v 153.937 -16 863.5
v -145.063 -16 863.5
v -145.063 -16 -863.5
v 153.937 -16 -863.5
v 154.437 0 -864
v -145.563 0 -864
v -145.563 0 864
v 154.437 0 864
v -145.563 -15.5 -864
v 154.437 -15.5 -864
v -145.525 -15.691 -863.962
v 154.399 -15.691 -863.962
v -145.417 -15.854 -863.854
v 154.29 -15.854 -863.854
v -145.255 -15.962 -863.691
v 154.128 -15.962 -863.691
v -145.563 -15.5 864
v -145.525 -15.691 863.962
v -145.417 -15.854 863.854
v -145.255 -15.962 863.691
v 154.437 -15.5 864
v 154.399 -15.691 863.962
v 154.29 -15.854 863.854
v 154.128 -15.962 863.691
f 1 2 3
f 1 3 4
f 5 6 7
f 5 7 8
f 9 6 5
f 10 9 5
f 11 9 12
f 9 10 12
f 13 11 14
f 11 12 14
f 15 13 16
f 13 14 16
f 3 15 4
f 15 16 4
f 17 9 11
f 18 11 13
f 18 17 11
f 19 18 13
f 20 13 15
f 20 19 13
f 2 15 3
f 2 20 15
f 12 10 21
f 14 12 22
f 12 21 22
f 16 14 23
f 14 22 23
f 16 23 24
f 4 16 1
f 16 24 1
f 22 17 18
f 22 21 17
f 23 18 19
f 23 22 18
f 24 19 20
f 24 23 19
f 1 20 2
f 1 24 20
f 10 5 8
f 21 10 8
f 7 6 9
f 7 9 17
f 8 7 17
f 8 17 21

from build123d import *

# Parameters (mm, degrees)
F0_W     = 300
F0_H     = 1728
F1_DEPTH = 16
F2_R     = 0.5
F3_ANGLE = 180


# Not quite as in the source:
# - a feature of the source that left no trace in its solid (it failed there, or was rolled back) is left out


with BuildPart() as f1:
    # F0 (on Front) → F1 (new body)
    with BuildSketch(Plane.XZ):
        with Locations((4.4365953654, 0)):
            Rectangle(F0_W, F0_H)
    extrude(amount=F1_DEPTH)

    # F2
    f2_edges = [f1.edges().sort_by_distance(p)[0] for p in [
        (154.436595, -16, 0),
        (4.436595, -16, 864),
        (-145.563405, -16, 0),
        (4.436595, -16, -864),
    ]]
    fillet(f2_edges, radius=F2_R)


with BuildPart() as f3_1:
    # F3: copy of F1
    add(f1.part.rotate(Axis((154.4365953654, 0, 0), (0, 0, -1)), F3_ANGLE))


solid = f1.part
